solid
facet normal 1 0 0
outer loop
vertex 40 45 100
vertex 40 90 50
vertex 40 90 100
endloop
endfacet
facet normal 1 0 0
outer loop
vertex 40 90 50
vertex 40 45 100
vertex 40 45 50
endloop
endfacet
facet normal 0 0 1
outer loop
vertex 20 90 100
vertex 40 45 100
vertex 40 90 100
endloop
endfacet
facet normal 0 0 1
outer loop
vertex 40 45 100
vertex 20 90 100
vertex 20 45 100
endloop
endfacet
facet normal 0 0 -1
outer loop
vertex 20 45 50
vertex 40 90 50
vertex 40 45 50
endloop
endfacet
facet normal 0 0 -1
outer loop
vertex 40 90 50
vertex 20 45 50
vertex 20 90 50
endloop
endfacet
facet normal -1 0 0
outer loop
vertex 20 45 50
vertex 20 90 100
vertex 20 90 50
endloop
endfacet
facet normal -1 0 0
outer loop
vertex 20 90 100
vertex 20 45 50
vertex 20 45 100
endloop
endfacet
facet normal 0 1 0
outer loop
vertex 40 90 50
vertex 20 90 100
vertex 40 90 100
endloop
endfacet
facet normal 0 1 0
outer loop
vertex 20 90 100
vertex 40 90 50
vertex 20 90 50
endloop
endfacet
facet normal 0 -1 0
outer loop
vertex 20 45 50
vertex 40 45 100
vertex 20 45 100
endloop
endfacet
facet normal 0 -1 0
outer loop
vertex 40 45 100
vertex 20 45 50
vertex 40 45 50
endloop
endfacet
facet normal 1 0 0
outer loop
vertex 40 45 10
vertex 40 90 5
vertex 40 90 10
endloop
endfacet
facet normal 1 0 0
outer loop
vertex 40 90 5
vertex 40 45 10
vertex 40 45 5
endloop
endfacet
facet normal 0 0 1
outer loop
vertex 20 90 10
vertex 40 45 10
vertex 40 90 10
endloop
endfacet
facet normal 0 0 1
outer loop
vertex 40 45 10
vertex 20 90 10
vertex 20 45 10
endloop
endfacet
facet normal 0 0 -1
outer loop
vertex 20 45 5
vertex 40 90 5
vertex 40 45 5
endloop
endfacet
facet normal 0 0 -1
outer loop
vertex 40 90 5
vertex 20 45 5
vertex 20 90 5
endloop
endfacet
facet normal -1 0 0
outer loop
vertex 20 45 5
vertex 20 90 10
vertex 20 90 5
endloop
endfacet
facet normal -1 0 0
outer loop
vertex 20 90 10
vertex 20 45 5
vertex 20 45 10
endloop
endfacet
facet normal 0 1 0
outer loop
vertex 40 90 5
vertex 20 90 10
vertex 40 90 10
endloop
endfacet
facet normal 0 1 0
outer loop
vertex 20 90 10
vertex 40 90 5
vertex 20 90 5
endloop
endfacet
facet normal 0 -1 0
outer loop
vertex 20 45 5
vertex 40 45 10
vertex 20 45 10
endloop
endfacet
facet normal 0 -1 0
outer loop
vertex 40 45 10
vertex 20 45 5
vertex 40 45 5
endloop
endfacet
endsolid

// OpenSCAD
// L-shaped mounting bracket for NEMA 17 stepper motor (e.g. syringe pump)
// Print orientation: base plate on bed, vertical plate builds up in +Z

$fn = 64;

// ---- Base plate ----
base_x1 = -25;      // base plate left edge (X)
base_x2 = 25;       // base plate right edge (X)
base_y  = 45;       // base plate depth (Y)
base_t  = 5;        // base plate thickness (Z)

// ---- Motor plate ----
motor_x1 = -25;     // motor plate left edge (X)
motor_x2 = 25;      // motor plate right edge (X)
motor_y  = 5;       // motor plate depth (Y)
motor_h  = 50;      // motor plate height (Z)

// ---- Boss hole ----
boss_d   = 23;      // motor centring boss hole diameter
boss_x   = 0;       // boss hole centre X
boss_z   = 28;      // boss hole centre Z

// ---- Screw holes ----
screw_d = 3.4;      // M3 screw hole diameter
screw_pitch = 31;   // square pattern side length

// ---- Gussets ----
gusset_t = 5;       // gusset thickness (X)
gusset_leg = 20;    // right triangle legs along +Y and +Z

// ---- Cutting overlap ----
eps = 0.5;          // extension past cut faces

// ---- Derived ----
leg1 = [base_x1, base_y, base_t];                 // base plate left leg
leg2 = [motor_x2 - gusset_t, base_y, motor_h];    // motor plate right leg
leg3 = [motor_x2 - gusset_t, base_y, gusset_t];   // gusset right leg
leg4 = [base_x1 + gusset_t, base_y, gusset_t];    // gusset left leg
leg5 = [base_x1 + gusset_t, base_y, motor_h];     // base plate left leg (full)

difference() {
    union() {
        translate(leg1) cube(leg1);
        translate(leg2) cube(leg2);
        translate(leg3) cube(leg3);
        translate(leg4) cube(leg4);
        translate(leg5) cube(leg5);
    }

    // Base plate through-holes (M4)
    translate([-17, 30, -eps]) cylinder(d = 4.5, h = base_t + 2 * eps);
    translate([17, 30, -eps]) cylinder(d = 4.5, h = base_t + 2 * eps);

    // Motor plate boss hole (along Y)
    translate([boss_x, -eps, boss_z]) cylinder(d = boss_d, h = motor_y + 2 * eps);

    // Motor plate screw holes (M3, square pattern)
    for (i = [0 : 3]) {
        a = i % 2;
        b = i / 2;
        translate([b * screw_pitch - screw_pitch / 2,
                   a * screw_pitch - screw_pitch / 2,
                   -eps])
            cylinder(d = screw_d, h = motor_y + 2 * eps);
    }
}
